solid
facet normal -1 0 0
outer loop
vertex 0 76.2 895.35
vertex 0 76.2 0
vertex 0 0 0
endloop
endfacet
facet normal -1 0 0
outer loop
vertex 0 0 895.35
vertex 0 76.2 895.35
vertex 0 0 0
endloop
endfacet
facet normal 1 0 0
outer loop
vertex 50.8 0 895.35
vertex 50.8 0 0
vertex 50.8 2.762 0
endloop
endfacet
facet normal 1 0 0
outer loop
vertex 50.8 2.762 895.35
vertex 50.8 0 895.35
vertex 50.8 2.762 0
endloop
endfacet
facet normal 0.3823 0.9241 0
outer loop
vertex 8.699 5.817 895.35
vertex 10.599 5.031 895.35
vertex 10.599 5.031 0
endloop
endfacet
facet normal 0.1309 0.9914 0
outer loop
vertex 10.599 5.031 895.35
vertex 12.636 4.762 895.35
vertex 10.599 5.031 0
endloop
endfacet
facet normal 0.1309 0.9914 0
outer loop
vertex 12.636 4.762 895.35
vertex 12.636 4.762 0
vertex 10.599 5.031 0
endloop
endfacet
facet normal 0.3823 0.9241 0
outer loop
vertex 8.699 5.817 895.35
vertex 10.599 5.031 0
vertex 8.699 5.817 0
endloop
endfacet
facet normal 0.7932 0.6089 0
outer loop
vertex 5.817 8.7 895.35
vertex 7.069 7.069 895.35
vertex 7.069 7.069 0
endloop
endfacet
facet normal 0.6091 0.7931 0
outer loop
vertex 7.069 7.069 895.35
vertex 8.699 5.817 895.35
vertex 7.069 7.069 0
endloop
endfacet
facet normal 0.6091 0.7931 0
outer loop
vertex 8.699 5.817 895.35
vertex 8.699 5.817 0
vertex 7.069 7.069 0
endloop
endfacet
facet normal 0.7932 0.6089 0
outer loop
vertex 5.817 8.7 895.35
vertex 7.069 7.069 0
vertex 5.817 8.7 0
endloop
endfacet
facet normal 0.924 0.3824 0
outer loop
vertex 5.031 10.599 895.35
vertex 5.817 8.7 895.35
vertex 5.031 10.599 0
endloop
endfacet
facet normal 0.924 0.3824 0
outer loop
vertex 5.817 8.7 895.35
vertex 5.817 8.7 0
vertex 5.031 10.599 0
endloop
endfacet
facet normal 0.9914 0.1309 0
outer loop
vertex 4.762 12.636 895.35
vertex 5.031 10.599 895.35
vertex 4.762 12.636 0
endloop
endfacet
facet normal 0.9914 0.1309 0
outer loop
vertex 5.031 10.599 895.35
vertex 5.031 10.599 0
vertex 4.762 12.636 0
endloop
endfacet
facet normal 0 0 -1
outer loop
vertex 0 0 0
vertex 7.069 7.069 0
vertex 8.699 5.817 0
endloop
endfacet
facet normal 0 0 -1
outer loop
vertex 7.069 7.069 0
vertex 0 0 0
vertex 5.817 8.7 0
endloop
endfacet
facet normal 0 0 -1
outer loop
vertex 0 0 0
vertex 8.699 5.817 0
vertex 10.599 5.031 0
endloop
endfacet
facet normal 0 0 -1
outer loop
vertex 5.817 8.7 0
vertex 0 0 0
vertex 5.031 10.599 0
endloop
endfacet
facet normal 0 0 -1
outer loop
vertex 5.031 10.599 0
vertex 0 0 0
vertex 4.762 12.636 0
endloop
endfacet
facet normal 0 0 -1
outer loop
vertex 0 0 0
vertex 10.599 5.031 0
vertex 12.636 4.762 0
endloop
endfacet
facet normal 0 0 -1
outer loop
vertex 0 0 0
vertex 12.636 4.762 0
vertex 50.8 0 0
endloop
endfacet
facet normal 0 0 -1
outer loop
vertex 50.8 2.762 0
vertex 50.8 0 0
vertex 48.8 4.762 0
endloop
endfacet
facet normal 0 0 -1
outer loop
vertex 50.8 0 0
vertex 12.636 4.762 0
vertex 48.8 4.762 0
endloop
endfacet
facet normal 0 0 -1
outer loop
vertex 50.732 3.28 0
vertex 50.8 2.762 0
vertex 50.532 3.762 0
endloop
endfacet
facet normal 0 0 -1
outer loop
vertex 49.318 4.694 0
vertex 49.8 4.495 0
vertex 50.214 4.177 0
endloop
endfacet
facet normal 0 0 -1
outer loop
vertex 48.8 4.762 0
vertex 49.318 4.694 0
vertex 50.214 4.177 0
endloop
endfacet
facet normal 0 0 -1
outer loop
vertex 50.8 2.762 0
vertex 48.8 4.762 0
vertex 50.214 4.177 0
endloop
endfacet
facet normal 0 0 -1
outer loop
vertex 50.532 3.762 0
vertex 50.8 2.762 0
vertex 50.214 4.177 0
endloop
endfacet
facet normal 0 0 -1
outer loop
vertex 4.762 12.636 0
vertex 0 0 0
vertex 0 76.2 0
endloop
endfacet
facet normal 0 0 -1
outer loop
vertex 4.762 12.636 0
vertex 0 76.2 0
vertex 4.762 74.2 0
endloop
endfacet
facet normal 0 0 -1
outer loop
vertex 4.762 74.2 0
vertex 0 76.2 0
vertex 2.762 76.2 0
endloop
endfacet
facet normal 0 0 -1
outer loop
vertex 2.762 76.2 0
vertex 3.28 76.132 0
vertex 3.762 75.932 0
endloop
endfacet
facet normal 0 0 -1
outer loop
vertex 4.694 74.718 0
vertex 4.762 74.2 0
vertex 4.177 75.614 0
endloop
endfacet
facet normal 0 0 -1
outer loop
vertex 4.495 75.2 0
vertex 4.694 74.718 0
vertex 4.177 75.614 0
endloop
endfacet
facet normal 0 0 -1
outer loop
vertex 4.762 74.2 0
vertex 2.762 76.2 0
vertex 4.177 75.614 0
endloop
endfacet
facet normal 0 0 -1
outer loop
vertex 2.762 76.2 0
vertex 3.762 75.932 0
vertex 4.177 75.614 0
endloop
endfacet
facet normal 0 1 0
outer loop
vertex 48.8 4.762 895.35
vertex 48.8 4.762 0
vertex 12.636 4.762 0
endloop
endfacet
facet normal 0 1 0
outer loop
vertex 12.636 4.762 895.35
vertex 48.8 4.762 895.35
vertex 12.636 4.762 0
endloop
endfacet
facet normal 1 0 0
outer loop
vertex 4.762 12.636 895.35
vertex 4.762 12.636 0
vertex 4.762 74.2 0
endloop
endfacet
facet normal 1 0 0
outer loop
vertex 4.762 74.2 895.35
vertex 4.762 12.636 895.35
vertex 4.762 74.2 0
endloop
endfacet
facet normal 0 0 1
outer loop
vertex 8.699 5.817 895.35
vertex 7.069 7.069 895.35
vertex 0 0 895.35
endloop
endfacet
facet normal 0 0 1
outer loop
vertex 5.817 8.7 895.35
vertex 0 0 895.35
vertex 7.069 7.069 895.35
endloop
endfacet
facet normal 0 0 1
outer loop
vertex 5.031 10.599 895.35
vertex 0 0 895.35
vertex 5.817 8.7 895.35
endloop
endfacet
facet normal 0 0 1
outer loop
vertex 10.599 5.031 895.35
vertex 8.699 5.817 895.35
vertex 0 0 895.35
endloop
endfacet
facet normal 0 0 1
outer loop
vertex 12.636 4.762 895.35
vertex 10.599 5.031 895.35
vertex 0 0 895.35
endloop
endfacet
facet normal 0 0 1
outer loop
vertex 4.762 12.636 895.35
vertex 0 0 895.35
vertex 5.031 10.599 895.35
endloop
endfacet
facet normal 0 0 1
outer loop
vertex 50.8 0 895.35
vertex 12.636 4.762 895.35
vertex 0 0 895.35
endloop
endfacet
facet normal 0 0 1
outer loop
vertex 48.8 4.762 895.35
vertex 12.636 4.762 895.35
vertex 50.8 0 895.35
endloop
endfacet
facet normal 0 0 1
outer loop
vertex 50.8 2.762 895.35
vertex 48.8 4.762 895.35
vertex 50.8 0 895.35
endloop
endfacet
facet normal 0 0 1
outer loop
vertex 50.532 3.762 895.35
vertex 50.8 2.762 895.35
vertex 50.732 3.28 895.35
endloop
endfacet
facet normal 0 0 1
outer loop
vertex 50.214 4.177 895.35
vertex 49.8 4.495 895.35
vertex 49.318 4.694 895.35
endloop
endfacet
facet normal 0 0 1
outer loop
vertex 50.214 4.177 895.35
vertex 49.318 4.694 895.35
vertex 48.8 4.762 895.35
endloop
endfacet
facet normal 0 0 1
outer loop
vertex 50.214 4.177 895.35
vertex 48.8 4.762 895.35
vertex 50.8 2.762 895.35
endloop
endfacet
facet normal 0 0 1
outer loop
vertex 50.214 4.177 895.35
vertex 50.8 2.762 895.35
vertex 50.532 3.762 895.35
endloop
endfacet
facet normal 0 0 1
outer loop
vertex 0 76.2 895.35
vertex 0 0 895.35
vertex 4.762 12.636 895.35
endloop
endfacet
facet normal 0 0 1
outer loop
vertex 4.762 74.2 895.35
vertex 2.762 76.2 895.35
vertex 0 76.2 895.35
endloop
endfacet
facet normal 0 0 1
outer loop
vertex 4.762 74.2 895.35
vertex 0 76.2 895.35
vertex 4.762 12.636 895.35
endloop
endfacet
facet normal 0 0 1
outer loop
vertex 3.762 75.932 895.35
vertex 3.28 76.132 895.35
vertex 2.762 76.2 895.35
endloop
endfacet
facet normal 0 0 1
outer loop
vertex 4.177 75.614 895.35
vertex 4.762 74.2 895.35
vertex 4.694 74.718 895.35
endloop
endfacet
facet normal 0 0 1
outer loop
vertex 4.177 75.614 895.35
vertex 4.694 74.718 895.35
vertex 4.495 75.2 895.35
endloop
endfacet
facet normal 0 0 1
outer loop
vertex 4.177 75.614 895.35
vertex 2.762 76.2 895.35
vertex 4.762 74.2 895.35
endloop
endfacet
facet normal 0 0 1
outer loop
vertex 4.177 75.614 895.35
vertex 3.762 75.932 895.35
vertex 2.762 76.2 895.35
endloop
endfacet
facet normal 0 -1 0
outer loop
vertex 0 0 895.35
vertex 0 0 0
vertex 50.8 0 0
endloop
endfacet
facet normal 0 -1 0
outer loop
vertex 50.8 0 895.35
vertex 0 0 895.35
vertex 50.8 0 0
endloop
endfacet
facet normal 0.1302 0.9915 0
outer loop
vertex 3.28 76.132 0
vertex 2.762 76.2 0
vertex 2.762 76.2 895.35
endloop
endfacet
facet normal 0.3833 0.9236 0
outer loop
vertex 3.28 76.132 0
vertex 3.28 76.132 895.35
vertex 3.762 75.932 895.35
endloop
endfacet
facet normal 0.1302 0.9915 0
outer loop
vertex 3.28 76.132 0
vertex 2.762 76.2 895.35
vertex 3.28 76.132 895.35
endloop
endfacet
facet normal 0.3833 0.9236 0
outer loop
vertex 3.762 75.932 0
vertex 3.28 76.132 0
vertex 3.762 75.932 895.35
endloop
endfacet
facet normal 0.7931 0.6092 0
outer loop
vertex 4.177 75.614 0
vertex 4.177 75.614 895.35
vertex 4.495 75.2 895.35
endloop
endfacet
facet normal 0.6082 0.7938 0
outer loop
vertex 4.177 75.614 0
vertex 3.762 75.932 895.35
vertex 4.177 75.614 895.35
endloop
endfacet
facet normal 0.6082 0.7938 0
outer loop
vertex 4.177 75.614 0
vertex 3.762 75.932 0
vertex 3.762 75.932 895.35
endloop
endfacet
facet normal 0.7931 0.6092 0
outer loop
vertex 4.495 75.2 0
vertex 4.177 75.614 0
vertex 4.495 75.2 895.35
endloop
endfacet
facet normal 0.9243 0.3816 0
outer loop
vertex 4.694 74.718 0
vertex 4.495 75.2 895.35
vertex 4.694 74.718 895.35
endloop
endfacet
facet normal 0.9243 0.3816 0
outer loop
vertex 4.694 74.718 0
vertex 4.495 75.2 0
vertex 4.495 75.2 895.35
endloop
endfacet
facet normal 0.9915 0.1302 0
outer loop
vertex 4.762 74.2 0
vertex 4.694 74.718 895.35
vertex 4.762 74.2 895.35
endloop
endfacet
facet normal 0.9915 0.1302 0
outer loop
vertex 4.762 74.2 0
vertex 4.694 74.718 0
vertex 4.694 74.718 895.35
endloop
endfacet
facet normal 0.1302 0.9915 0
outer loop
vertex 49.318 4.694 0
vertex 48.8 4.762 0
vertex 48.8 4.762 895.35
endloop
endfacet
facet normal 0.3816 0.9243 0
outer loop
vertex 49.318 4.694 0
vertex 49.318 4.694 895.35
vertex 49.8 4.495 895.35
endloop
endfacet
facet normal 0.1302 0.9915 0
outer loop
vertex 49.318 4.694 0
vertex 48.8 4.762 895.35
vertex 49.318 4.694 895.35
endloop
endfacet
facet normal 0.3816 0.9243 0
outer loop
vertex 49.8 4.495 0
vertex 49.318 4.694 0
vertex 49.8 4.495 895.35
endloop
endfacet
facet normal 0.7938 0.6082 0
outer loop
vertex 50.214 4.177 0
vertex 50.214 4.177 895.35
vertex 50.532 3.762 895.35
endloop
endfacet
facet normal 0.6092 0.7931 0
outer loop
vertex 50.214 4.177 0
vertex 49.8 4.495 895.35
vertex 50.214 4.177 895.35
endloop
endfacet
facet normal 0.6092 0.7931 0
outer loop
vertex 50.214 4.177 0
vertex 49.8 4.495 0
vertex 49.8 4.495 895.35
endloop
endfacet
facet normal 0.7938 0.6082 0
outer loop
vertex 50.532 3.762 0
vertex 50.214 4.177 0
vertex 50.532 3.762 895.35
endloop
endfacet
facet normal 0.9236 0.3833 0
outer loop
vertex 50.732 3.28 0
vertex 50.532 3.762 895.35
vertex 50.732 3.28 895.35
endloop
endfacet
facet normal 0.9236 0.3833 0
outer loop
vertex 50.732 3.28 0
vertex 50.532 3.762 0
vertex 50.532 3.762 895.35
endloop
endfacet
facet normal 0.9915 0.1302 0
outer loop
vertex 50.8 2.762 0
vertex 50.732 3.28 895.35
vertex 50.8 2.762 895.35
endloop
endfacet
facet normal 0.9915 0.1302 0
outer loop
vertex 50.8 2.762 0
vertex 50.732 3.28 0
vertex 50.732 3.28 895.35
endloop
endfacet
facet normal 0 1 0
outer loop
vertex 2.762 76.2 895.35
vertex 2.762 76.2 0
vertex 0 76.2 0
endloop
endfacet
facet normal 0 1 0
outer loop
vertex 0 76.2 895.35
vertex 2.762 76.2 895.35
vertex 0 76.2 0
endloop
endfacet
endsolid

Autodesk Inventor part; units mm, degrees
ref_plane "Start plane" through (0, 0, 0) normal (0, 0, 1) x (1, 0, 0)
ref_plane "End plane" through (0, 0, 895.35) normal (0, 0, 1) x (1, 0, 0)
sketch "Sketch" plane through (0, 0, 0) normal (0, 0, 1) x (1, 0, 0)
  line L0 (0, 76.2) -> (0, 0)
  line L1 (0, 0) -> (50.8, 0)
  line L2 (50.8, 0) -> (50.8, 2.7625)
  line L3 (48.8, 4.7625) -> (12.6365, 4.7625)
  line L4 (4.7625, 12.6365) -> (4.7625, 74.2)
  line L5 (2.7625, 76.2) -> (0, 76.2)
  line L6 (-7.0414, 0) -> (21.5385, 0) construction
  line L7 (0, -8.0414) -> (0, 34.5385) construction
  arc A0 (4.7625, 12.6365) -> (12.6365, 4.7625) centre (12.6365, 12.6365) ccw
  arc A1 (50.8, 2.7625) -> (48.8, 4.7625) centre (48.8, 2.7625) ccw
  arc A2 (4.7625, 74.2) -> (2.7625, 76.2) centre (2.7625, 74.2) ccw
  line L8 (0, 93.5453) -> (0, -24.9725) construction
  line L9 (-18.6925, 0) -> (62.8653, 0) construction
  point P0 (50.8, 4.7625)
  point P1 (4.7625, 4.7625)
  point P2 (4.7625, 76.2)
  dimension "d12" = 4.7625
  dimension "d13" = 76.2
  dimension "d14" = 50.8
  dimension "d15" = 0
  dimension "d16" = 4.7625
  dimension "d17" = 0
  dimension "d18" = 7.874
  dimension "d19" = 2
extrude "Body" add sketch "Sketch" along normal up to surface (895.35 mm away) from surface at 0
ref_plane "Work Plane3" through (0, 2.7625, 895.35) normal (0, 0, 1) x (1, 0, 0)
split "Split1" plane through (0, 2.7625, 895.35) removes the side toward (0, 0, 1)
equation "\"d12\" = G_T"
equation "\"d13\" = G_H"
equation "\"d14\" = G_W"
equation "\"d16\" = G_T"
equation "\"d18\" = G_IR"
equation "\"d4\" = G_L"
equation "\"G_W\" = 50.8"
equation "\"G_H\" = 76.2"
equation "\"G_T\" = 4.7625"
equation "\"G_ER\" = 4.064"
equation "\"G_IR\" = 7.874"
equation "\"G_L\" = B_L + G_OFFSET_START + G_OFFSET_END"
equation "\"ex\" = 0"
equation "\"ey\" = 0"
equation "\"G_OFFSET_START\" = 0"
equation "\"G_OFFSET_END\" = 50.8"
equation "\"d21\" = G_OFFSET_END + B_L"
equation "\"B_L\" = 844.55"
properties part number "ANSI L 3 x 2 x 3_16 00000007"
